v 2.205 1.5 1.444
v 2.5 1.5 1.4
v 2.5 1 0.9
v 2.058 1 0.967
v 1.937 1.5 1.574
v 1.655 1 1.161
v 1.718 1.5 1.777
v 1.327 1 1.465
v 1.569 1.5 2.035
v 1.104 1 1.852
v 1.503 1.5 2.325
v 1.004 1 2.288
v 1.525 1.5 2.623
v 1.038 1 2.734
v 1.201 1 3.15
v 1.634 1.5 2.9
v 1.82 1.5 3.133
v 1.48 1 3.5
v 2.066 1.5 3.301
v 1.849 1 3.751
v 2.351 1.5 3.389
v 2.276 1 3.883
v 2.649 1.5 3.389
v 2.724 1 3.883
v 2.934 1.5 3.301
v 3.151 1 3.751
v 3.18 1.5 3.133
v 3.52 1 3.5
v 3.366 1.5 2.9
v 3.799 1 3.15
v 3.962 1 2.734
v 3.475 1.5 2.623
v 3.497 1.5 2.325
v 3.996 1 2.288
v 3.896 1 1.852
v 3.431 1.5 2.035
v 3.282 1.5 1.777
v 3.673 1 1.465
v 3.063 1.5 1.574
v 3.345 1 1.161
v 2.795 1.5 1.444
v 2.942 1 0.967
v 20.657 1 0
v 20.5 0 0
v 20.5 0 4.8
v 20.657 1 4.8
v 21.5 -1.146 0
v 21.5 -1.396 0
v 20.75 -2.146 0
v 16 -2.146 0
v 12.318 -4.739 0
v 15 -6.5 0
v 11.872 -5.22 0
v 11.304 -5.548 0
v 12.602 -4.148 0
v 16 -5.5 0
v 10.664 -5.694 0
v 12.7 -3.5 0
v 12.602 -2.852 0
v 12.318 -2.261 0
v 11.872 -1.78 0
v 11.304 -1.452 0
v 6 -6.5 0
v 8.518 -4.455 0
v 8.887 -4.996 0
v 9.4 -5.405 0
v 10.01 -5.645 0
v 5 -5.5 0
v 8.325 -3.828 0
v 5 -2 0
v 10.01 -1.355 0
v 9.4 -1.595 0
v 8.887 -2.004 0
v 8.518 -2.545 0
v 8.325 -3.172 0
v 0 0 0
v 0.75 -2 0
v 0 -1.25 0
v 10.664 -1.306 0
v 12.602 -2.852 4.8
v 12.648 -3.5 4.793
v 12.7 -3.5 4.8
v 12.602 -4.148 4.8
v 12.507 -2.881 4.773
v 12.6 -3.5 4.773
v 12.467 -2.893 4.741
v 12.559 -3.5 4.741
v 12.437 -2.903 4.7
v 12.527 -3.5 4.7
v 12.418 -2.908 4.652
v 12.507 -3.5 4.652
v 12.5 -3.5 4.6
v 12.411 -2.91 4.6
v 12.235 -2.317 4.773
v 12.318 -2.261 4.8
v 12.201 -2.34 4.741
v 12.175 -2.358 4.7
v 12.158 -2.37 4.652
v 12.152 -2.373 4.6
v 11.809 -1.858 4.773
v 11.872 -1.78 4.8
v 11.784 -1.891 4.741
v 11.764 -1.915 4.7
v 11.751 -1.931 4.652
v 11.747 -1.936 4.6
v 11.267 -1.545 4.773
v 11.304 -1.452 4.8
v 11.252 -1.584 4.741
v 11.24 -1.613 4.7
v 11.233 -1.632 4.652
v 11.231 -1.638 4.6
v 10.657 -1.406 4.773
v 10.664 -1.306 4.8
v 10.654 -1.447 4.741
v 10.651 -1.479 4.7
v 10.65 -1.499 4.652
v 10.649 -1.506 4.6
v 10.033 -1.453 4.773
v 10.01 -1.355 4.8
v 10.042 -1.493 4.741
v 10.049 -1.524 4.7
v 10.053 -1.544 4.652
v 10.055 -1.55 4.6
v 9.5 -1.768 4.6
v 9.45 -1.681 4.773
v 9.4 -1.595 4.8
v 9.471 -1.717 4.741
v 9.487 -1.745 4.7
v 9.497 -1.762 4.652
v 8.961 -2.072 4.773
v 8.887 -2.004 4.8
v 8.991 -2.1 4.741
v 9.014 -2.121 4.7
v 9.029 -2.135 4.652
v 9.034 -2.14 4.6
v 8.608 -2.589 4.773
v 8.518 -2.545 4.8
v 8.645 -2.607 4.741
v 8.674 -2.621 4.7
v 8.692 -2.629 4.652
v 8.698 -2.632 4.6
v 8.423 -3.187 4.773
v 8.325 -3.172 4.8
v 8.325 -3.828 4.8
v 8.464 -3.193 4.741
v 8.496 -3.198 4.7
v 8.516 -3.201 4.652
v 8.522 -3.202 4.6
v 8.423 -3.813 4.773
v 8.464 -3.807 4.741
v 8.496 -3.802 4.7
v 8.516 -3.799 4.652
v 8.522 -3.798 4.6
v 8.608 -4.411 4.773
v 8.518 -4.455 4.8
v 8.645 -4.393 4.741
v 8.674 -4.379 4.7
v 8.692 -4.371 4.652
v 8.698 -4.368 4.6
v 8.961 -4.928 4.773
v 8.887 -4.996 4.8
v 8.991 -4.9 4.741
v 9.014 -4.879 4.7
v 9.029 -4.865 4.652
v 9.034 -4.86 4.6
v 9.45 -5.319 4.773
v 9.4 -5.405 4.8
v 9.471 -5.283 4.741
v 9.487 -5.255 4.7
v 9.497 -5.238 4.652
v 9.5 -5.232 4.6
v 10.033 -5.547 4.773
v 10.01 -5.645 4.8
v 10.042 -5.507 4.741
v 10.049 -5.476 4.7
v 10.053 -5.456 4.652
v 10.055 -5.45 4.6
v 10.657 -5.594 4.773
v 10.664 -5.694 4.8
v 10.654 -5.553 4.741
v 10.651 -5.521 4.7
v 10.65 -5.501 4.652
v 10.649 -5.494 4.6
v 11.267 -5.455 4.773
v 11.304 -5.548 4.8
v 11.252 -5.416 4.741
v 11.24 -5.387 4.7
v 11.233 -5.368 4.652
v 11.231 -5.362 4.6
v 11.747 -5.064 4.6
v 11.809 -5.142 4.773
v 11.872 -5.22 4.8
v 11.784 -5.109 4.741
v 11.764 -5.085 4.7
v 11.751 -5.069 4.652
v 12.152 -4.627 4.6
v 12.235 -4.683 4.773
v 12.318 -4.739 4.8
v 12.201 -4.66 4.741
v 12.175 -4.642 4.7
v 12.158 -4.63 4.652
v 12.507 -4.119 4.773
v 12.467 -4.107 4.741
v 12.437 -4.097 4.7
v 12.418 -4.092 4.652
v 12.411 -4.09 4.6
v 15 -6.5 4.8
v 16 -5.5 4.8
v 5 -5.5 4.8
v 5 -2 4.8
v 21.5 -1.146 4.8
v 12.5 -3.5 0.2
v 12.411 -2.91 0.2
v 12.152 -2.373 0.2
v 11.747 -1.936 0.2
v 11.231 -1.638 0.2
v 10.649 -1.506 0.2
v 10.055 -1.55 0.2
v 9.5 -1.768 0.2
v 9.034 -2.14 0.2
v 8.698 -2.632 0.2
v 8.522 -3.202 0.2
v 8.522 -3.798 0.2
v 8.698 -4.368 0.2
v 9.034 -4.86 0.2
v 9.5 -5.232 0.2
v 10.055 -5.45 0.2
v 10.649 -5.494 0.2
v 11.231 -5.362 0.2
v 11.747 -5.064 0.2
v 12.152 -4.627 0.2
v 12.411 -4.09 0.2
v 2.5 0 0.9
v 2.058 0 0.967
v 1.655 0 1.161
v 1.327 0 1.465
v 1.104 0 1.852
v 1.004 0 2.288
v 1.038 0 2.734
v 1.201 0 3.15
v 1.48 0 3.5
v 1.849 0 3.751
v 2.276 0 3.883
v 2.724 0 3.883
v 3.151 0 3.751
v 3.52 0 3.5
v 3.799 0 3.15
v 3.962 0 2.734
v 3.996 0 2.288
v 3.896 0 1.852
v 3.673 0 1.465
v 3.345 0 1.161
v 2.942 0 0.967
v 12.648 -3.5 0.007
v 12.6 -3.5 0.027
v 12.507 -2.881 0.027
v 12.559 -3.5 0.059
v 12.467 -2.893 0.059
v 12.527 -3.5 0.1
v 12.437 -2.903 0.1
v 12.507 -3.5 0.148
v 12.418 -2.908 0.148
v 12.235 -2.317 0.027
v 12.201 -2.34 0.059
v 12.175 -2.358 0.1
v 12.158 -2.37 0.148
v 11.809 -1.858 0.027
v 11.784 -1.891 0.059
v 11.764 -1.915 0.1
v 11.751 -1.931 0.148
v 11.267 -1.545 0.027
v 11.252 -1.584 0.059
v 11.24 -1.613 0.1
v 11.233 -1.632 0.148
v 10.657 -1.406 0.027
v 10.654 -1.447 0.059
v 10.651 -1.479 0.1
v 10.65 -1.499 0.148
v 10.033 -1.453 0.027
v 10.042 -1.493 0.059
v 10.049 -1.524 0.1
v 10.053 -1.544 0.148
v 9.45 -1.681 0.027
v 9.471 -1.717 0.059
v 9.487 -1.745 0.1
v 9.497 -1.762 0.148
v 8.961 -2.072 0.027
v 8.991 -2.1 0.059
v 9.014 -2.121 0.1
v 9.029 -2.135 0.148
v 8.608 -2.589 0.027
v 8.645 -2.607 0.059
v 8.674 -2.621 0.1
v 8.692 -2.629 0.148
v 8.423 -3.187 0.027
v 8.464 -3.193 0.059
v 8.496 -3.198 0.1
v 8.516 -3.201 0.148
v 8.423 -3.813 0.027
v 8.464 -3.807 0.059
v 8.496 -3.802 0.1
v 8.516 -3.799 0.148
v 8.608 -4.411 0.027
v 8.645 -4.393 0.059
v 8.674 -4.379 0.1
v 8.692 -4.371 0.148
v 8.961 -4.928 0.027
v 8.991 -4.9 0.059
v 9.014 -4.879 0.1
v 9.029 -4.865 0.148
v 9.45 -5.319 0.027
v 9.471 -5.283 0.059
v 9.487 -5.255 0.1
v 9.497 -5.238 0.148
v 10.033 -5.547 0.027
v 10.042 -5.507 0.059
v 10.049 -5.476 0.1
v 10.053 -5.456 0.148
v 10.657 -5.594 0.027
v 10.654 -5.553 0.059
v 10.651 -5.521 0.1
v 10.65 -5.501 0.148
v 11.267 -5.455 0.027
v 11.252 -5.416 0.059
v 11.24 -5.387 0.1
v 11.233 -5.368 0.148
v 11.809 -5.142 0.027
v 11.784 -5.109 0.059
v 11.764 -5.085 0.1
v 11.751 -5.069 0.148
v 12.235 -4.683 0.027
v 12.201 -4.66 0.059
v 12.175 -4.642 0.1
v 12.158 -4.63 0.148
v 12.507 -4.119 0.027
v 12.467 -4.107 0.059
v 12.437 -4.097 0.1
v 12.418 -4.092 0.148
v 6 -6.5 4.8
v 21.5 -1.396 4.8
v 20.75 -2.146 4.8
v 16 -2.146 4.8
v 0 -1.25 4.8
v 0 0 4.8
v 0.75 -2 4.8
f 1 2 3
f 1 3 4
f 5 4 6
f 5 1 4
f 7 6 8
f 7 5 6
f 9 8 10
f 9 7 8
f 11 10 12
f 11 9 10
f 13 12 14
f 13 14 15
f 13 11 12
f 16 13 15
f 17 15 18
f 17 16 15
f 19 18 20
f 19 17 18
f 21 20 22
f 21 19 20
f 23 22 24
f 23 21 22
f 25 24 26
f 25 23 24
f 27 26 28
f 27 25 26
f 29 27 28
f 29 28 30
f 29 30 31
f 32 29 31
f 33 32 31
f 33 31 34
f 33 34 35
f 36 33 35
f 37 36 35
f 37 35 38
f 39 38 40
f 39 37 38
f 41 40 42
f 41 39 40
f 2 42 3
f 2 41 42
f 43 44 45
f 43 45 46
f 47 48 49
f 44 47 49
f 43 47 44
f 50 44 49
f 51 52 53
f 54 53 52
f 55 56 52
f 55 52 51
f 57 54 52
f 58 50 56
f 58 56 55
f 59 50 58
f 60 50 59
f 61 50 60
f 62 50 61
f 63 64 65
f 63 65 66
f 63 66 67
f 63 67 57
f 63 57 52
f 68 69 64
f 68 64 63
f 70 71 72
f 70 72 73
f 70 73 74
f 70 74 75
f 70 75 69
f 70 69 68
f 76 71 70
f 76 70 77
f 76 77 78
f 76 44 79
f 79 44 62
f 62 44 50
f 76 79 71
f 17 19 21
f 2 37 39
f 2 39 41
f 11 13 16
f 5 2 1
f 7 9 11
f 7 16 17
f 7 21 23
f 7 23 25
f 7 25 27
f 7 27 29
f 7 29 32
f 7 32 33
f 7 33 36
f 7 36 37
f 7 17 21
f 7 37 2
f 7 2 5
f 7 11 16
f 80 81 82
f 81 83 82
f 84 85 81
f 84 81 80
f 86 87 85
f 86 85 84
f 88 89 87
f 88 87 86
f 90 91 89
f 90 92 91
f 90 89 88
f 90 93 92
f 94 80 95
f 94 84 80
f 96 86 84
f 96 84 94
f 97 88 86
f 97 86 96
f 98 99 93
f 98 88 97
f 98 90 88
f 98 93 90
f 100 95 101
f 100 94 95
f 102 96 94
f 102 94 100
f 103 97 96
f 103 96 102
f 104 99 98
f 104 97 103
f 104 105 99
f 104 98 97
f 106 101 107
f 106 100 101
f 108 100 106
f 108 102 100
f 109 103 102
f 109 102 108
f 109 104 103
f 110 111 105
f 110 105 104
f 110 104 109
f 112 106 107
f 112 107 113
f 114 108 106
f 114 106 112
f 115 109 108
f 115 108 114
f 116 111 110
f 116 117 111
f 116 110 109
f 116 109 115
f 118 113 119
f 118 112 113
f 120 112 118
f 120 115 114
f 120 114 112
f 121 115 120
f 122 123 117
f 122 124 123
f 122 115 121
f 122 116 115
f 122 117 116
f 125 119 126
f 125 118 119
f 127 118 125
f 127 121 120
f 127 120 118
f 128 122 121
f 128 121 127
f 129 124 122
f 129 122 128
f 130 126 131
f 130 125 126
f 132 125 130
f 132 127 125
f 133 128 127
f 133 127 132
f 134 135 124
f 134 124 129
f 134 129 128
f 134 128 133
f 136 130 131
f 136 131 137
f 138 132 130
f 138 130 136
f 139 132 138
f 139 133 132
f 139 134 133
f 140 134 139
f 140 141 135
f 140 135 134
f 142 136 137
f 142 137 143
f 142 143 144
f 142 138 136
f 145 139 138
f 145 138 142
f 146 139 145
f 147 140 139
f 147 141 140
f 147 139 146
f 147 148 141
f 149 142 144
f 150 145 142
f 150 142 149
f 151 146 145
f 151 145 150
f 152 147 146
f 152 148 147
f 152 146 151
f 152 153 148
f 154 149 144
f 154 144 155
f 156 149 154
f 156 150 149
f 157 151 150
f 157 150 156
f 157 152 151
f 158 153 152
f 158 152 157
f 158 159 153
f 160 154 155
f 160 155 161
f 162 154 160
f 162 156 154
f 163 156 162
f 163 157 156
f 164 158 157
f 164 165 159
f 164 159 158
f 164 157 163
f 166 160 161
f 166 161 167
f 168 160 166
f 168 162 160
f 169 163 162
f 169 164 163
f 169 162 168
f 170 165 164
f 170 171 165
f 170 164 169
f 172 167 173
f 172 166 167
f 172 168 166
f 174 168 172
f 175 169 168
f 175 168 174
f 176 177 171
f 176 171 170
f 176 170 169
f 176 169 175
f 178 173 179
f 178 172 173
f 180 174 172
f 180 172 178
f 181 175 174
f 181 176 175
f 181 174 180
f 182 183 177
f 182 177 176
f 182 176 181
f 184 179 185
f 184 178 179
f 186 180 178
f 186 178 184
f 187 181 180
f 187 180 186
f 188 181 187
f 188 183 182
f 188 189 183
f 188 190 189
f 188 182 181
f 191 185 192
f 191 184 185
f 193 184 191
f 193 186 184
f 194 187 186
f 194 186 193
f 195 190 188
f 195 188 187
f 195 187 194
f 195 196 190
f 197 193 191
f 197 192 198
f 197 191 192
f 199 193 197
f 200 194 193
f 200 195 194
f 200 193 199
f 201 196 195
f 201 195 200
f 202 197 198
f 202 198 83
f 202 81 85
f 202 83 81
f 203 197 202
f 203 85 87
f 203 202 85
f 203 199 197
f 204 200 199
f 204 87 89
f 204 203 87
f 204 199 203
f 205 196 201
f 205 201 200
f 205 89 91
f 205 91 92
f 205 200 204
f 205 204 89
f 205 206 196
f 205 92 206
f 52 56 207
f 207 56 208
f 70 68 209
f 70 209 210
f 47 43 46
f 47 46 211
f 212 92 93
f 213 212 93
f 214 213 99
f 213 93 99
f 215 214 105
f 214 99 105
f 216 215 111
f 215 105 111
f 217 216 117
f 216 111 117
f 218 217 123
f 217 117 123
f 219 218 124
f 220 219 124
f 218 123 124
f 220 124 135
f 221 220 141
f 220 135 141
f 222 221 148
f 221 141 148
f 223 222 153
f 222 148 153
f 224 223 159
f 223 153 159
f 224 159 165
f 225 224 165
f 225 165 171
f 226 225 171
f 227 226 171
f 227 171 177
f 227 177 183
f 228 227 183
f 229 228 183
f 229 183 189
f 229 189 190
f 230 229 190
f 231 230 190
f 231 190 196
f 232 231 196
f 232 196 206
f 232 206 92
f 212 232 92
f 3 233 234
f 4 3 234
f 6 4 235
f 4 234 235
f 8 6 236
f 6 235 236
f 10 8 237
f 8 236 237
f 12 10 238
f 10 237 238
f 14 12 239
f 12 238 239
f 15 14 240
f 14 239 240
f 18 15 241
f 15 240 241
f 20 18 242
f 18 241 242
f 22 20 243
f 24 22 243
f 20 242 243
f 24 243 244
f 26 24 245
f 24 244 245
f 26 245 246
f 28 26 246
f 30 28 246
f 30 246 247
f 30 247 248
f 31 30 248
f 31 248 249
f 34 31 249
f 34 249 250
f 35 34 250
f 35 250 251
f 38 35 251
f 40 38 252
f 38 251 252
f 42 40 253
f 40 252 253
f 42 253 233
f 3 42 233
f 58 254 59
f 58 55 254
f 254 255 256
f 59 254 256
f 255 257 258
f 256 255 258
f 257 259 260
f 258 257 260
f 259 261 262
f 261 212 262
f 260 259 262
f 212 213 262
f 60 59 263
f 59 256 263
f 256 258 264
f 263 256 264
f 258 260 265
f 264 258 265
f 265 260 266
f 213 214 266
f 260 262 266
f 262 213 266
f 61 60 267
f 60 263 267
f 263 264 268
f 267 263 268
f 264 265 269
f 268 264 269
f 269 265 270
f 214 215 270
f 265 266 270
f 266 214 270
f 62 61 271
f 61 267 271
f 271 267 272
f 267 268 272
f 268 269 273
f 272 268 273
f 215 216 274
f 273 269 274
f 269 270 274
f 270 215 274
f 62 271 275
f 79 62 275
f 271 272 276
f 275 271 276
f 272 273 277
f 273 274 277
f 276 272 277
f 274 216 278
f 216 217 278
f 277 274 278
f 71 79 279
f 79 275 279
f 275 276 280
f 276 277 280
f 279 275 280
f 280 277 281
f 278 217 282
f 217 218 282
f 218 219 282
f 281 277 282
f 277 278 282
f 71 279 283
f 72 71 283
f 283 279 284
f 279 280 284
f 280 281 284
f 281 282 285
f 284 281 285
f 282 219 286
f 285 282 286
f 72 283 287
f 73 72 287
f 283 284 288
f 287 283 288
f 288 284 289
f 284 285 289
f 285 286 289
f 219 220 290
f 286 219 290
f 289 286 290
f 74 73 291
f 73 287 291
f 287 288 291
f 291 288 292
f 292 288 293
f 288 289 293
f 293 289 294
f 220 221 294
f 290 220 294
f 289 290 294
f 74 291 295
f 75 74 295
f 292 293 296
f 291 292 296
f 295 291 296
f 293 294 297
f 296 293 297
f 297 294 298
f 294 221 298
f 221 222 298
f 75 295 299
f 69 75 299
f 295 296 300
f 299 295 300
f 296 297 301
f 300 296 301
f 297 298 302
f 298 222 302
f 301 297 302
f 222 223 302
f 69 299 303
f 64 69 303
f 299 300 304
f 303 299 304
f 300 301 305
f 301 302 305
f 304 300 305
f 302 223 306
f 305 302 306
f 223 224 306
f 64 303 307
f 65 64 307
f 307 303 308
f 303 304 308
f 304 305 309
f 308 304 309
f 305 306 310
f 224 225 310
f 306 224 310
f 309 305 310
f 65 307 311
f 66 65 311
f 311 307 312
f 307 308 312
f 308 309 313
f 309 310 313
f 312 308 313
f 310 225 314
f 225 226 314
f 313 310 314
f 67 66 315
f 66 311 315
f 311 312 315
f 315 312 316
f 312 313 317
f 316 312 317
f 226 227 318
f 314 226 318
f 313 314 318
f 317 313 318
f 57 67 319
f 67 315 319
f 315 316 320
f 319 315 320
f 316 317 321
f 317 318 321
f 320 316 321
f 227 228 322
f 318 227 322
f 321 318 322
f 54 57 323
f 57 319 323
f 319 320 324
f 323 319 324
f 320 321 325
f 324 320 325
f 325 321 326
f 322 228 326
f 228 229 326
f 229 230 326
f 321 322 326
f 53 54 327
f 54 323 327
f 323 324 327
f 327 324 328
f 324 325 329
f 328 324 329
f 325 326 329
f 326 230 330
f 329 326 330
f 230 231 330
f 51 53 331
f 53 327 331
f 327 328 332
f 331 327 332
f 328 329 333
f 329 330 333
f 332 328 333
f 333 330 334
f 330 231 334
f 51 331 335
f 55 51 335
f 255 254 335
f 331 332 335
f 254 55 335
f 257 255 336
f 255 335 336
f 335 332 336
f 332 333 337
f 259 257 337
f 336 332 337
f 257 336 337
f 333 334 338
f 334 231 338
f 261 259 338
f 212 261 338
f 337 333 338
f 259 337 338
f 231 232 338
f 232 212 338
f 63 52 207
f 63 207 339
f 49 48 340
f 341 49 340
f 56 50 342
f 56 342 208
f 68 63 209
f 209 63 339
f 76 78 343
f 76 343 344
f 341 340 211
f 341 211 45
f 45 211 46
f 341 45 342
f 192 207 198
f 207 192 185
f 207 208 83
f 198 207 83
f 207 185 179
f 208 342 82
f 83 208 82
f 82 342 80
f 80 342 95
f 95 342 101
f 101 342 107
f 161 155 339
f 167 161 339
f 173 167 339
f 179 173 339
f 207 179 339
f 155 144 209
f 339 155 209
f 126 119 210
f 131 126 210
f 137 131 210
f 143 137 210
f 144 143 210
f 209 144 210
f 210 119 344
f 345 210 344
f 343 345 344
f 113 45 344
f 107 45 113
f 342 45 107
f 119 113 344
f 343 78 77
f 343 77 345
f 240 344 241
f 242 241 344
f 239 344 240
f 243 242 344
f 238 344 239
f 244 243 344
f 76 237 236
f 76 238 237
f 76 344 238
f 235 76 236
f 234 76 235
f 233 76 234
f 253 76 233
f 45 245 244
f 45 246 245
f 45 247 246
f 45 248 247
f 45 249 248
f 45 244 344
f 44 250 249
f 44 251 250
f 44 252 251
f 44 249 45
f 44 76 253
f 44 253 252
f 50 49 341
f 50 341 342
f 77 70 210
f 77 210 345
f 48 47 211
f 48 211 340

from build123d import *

# Parameters (mm, degrees)
EXTRUDE_1_DEPTH     = 4.8
SKETCH_2_R          = 2
CUT_EXTRUDE_1_DEPTH = 10
CHAMFER_1_SIZE      = 1
CHAMFER_2_SIZE      = 0.75
SKETCH_3_R          = 1.5
EXTRUDE_2_DEPTH     = 1.5
CHAMFER_3_SIZE      = 0.5
FILLET_2_R          = 0.2


with BuildPart() as part:
    # 스케치1 → 보스-돌출1 (new body)
    with BuildSketch(Plane.XY):
        Polygon((0, 0), (20.5, 0), (20.657326787, 1), (21.5, -1.146107212), (21.5, -2.146107212), (16, -2.146107212), (16, -6.5), (5, -6.5), (5, -2), (0, -2), align=None)
    extrude(amount=EXTRUDE_1_DEPTH)

    # 스케치2 → 컷-돌출1 (cut)
    with BuildSketch(Plane.XY.offset(4.8)):
        with Locations((10.5, -3.5)):
            Circle(SKETCH_2_R)
    extrude(amount=-CUT_EXTRUDE_1_DEPTH, mode=Mode.SUBTRACT)

    # 모따기1
    chamfer_1_edges = [part.edges().sort_by_distance(p)[0] for p in [
        (16, -6.5, 2.4),
        (5, -6.5, 2.4),
    ]]
    chamfer(chamfer_1_edges, length=CHAMFER_1_SIZE)

    # 모따기2
    chamfer_2_edges = [part.edges().sort_by_distance(p)[0] for p in [
        (21.5, -2.146107212, 2.4),
        (0, -2, 2.4),
    ]]
    chamfer(chamfer_2_edges, length=CHAMFER_2_SIZE)

    # 스케치3 → 보스-돌출2 (add)
    with BuildSketch(Plane(origin=(0, 0, 0), x_dir=(1, 0, 0), z_dir=(0, 1, 0))):
        with Locations(Location((2.5, -2.4, 0), (0, 0, 90))):
            Circle(SKETCH_3_R)
    extrude(amount=EXTRUDE_2_DEPTH)

    # 모따기3
    chamfer_3_edges = [part.edges().sort_by_distance(p)[0] for p in [
        (2.5, 1.5, 3.9),
    ]]
    chamfer(chamfer_3_edges, length=CHAMFER_3_SIZE)

    # 필렛2
    fillet_2_edges = [part.edges().sort_by_distance(p)[0] for p in [
        (8.5, -3.5, 0),
        (8.5, -3.5, 4.8),
    ]]
    fillet(fillet_2_edges, radius=FILLET_2_R)


solid = part.part
